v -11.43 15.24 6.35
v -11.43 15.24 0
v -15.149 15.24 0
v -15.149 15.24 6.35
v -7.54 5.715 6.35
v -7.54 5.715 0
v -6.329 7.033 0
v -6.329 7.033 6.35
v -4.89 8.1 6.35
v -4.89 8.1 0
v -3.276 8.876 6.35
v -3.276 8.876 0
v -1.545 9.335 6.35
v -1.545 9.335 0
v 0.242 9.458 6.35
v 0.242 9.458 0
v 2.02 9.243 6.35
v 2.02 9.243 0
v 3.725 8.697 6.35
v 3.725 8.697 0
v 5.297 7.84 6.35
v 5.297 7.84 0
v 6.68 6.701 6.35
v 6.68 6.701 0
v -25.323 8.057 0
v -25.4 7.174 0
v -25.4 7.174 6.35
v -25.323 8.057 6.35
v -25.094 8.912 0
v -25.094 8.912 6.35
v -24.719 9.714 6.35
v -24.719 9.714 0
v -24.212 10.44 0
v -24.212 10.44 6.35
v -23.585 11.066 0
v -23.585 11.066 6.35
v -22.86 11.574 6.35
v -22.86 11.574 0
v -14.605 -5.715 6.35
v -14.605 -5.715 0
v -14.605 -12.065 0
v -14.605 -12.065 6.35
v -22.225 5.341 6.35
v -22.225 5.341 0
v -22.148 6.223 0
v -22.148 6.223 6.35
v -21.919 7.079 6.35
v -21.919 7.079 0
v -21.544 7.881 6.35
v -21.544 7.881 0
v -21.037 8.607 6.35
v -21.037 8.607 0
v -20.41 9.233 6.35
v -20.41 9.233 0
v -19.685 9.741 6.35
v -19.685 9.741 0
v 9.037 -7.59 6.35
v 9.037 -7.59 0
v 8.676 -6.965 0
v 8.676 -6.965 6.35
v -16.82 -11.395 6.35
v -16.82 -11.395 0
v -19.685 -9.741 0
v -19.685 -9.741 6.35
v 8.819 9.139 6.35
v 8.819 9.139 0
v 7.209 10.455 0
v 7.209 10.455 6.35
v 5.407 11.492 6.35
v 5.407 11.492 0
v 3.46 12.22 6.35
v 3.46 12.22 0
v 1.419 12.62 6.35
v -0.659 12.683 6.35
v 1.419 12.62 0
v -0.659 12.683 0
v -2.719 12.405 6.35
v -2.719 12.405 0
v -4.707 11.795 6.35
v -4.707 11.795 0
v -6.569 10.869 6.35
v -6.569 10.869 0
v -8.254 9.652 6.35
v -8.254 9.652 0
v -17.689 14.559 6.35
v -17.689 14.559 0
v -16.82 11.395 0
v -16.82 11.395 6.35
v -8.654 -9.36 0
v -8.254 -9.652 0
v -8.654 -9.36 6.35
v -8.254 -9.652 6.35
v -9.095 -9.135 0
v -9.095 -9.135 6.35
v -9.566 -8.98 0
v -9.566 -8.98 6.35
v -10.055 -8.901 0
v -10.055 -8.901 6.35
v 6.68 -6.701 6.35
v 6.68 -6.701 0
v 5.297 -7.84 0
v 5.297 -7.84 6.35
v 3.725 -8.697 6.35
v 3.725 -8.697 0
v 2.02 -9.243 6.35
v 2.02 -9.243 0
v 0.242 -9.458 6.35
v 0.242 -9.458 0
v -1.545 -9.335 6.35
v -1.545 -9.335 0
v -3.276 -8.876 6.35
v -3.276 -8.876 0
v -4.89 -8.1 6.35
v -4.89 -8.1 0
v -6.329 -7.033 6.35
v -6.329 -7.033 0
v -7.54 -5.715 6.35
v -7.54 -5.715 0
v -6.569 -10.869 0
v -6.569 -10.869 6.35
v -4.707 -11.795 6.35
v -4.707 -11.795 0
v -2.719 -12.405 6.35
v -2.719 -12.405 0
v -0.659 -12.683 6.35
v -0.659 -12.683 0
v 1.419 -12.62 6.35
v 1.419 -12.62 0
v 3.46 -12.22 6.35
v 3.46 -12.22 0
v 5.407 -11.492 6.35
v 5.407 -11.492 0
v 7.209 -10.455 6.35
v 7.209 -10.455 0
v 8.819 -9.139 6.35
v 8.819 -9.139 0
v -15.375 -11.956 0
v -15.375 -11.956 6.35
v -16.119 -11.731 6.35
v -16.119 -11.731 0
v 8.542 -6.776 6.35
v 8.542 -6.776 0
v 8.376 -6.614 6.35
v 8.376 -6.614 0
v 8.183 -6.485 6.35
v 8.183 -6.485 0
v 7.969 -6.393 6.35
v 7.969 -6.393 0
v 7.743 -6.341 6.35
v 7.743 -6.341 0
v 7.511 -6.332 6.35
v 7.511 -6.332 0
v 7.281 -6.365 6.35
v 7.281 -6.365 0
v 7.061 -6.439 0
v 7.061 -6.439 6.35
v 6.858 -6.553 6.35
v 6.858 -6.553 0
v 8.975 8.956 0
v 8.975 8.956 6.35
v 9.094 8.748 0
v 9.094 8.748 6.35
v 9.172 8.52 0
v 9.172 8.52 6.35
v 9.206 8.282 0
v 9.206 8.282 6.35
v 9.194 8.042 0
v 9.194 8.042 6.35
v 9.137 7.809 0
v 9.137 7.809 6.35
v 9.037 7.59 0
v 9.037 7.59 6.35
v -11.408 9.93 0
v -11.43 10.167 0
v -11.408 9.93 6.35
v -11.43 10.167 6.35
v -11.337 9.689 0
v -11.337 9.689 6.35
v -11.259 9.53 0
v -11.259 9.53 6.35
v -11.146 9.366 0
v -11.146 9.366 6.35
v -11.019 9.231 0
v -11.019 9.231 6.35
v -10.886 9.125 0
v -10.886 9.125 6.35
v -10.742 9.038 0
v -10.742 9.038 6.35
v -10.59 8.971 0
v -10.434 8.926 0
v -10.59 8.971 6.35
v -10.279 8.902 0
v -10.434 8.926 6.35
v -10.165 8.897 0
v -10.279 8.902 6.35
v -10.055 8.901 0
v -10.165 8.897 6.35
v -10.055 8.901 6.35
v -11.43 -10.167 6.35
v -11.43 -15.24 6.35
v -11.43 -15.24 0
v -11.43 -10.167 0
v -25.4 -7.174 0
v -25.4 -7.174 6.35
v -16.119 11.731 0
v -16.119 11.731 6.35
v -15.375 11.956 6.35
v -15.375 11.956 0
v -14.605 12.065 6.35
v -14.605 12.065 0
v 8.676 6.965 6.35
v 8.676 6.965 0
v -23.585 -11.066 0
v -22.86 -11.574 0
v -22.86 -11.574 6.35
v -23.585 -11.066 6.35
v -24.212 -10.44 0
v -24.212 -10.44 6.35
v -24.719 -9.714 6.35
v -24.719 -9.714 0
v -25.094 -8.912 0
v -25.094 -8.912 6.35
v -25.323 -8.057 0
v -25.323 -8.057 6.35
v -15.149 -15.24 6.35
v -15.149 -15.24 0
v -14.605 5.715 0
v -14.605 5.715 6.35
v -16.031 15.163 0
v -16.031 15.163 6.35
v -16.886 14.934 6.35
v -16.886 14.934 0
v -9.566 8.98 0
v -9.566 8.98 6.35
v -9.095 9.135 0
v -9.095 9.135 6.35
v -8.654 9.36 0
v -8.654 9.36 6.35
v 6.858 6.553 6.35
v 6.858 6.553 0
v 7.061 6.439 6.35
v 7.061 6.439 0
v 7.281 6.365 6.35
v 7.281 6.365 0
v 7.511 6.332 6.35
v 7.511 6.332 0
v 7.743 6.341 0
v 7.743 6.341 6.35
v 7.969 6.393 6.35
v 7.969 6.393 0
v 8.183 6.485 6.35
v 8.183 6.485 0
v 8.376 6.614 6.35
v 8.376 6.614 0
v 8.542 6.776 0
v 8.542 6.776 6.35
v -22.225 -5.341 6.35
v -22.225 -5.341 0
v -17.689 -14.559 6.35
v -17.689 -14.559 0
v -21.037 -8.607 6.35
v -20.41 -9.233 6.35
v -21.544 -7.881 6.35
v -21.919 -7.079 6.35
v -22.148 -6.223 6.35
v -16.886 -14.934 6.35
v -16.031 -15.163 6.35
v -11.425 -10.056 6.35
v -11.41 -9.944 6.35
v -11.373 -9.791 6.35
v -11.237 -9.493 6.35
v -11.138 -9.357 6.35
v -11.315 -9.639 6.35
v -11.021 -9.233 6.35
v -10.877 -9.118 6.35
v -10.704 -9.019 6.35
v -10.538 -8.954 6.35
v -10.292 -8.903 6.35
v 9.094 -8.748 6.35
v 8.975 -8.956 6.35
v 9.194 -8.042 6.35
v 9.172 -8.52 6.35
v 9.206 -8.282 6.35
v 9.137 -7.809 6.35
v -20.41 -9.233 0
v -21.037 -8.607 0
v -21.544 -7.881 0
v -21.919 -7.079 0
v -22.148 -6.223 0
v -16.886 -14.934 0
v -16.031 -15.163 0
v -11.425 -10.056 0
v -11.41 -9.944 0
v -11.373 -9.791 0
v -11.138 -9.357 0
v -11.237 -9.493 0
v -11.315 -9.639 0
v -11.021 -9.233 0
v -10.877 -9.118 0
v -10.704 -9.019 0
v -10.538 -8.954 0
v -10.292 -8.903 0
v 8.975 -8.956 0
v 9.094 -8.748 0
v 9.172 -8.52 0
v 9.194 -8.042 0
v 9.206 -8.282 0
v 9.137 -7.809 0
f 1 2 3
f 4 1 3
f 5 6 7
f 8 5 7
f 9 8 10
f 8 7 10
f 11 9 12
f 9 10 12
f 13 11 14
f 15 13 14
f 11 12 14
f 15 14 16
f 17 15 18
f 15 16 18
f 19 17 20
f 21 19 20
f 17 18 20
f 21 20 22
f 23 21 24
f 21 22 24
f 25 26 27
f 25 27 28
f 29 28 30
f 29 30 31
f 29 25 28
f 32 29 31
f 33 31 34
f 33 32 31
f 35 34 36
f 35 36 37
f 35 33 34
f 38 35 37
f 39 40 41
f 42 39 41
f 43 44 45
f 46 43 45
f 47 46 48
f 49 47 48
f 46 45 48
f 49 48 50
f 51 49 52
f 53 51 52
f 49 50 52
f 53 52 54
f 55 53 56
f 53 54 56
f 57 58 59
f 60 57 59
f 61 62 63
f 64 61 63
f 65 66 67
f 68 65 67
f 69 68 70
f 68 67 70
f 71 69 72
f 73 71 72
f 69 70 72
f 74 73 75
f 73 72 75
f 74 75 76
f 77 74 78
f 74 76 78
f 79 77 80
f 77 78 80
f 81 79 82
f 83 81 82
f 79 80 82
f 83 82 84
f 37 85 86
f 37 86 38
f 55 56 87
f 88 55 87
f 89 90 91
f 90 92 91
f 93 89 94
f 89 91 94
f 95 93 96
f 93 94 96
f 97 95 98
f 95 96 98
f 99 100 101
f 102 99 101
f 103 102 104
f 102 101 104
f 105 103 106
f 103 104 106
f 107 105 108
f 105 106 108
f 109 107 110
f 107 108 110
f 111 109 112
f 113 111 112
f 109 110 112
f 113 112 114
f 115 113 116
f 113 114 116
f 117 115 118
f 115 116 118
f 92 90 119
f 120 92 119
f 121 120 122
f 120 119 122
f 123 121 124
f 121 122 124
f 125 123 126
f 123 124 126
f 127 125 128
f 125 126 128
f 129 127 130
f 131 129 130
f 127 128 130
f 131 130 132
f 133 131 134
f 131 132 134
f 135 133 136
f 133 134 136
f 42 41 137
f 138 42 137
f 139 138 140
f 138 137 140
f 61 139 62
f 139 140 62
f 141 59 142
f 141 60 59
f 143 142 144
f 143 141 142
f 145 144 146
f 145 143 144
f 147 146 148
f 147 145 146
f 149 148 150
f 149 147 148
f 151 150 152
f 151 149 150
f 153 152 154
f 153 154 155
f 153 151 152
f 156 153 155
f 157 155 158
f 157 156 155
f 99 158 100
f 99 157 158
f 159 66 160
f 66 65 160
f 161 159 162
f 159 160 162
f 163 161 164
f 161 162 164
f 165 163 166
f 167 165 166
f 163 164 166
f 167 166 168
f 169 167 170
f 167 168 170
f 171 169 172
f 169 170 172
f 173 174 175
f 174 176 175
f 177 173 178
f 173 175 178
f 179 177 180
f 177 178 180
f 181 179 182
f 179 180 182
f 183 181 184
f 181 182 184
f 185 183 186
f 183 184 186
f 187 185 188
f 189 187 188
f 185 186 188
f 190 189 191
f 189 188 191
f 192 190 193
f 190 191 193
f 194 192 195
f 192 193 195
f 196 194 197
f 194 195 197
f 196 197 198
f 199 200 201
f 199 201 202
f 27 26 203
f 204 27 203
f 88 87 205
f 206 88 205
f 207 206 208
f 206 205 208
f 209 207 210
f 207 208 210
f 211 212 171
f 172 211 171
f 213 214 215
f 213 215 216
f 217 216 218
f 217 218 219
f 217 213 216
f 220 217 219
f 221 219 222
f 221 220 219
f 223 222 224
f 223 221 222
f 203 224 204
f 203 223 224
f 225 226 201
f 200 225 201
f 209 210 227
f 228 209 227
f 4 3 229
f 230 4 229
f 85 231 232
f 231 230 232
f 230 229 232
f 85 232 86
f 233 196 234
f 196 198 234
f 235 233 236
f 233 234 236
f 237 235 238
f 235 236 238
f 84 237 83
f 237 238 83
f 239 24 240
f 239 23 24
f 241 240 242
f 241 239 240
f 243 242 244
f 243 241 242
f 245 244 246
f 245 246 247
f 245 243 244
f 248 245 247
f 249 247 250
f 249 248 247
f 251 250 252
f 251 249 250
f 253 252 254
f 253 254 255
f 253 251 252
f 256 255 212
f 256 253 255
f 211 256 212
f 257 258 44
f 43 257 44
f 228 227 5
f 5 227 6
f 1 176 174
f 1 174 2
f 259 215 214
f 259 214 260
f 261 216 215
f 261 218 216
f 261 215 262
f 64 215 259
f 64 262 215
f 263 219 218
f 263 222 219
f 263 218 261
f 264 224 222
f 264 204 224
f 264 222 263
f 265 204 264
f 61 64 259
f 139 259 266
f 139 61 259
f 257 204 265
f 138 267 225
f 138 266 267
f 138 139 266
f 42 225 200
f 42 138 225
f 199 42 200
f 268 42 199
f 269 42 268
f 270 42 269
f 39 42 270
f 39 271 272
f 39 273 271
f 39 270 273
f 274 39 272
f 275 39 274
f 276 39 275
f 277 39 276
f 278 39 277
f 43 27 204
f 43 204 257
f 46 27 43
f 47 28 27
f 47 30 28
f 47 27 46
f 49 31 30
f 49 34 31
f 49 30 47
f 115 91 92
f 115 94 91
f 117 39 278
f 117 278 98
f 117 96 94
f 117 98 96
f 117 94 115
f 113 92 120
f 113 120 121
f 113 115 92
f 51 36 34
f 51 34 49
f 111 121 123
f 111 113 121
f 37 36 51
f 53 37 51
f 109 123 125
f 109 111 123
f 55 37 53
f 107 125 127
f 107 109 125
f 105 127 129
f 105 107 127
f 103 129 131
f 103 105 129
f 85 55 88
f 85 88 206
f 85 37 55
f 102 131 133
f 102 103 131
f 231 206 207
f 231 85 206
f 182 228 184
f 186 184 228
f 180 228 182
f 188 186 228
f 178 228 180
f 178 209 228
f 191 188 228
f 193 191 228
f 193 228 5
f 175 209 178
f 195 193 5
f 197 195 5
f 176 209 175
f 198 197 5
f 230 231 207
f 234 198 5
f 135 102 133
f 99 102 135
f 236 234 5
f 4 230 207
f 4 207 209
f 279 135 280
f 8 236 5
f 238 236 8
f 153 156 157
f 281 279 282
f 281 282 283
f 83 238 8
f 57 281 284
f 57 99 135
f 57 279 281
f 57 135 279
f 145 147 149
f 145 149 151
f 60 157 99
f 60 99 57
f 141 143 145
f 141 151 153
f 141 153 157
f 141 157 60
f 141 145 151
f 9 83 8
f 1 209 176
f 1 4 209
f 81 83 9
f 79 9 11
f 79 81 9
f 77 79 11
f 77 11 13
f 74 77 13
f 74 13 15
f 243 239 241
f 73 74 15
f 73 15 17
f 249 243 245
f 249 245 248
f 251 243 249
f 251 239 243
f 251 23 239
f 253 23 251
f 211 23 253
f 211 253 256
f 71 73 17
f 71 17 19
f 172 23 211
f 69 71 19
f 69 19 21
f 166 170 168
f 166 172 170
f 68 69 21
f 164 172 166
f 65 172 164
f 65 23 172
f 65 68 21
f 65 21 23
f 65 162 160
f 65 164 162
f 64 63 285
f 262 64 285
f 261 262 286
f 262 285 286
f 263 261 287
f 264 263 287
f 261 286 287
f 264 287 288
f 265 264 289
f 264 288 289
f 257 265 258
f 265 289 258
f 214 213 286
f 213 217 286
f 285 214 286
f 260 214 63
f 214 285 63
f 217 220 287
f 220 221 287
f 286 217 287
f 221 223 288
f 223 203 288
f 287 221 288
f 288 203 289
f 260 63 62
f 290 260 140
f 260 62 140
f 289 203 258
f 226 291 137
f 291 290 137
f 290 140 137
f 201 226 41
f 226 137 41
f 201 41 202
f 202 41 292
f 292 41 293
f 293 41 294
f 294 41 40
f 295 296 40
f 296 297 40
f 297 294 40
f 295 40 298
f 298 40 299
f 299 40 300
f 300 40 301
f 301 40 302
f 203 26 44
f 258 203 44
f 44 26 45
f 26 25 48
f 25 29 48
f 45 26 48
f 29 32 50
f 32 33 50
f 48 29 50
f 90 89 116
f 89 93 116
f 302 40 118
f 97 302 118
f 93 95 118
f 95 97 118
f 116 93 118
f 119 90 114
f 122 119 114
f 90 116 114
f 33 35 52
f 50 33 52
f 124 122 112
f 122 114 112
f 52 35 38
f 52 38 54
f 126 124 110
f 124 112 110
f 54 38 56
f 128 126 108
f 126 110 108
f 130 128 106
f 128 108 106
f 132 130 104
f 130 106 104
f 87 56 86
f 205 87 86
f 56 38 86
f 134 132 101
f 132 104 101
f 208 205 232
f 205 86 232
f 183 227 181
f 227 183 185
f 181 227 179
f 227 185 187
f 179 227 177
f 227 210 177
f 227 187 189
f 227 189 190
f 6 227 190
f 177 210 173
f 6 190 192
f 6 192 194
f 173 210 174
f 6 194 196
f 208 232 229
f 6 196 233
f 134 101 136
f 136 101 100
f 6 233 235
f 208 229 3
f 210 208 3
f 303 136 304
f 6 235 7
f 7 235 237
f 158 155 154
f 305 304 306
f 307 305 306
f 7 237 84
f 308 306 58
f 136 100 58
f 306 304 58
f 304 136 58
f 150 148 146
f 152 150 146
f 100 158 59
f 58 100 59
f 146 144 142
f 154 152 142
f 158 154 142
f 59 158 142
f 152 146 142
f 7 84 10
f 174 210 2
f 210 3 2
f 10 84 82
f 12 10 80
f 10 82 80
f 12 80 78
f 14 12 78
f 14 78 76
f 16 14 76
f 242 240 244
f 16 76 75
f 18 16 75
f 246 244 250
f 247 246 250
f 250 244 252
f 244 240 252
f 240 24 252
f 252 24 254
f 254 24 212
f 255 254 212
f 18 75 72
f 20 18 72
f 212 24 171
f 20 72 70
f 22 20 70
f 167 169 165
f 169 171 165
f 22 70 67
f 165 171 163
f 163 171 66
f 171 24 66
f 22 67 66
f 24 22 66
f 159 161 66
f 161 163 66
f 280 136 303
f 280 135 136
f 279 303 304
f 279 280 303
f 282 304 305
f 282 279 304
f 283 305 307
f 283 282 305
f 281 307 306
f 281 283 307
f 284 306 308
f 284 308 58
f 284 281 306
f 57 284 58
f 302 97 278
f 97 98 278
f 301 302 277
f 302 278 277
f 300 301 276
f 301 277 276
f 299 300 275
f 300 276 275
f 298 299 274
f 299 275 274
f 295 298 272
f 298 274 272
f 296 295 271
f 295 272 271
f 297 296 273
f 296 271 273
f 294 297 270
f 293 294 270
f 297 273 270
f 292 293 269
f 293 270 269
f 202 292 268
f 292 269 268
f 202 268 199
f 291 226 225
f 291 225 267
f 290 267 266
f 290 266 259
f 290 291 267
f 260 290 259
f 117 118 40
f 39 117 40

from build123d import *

# Parameters (mm, degrees)
F1_DEPTH     = 6.35
F2_T1_DEPTH  = 6.35
F2_T3_DEPTH  = 6.35
F2_T5_DEPTH  = 6.35
F2_T7_DEPTH  = 6.35
F2_T9_DEPTH  = 13.1559094878
F2_T11_DEPTH = 21.0146968374
F2_T13_DEPTH = 21.0146968374
F2_T15_DEPTH = 13.1559094878
F3_R         = 3.175
F4_R         = 1.27
F5_R         = 1.27


# Not quite as in the source:
# - a fillet or chamfer that OpenCascade refuses, or shapes differently, is made with other operations: its cross-section is extruded or revolved along the edge and cut away or added


with BuildPart() as f1:
    # F0 (on Top) → F1 (new body)
    with BuildSketch(Plane.XY):
        with BuildLine():
            ThreePointArc((7.7709057387, -5.3975), (0.1961534845, -9.4594664786), (-7.5404746038, -5.715))
            Line((-7.5404746038, -5.715), (-14.605, -5.715))
            Line((-14.605, -5.715), (-14.605, -12.065))
            Line((-14.605, -12.065), (-15.659261314, -12.065))
            Line((-15.659261314, -12.065), (-22.225, -8.2742690022))
            Line((-22.225, -8.2742690022), (-22.225, 8.2742690022))
            Line((-22.225, 8.2742690022), (-15.659261314, 12.065))
            Line((-15.659261314, 12.065), (-14.605, 12.065))
            Line((-14.605, 12.065), (-14.605, 5.715))
            Line((-14.605, 5.715), (-7.5404746038, 5.715))
            ThreePointArc((-7.5404746038, 5.715), (0.1961534845, 9.4594664786), (7.7709057387, 5.3975))
            Line((7.7709057387, 5.3975), (9.5126338349, 8.4142615555))
            ThreePointArc((9.5126338349, 8.4142615555), (0.3250359785, 12.6958399333), (-9.0696141042, 8.89))
            Line((-9.0696141042, 8.89), (-11.43, 8.89))
            Line((-11.43, 8.89), (-11.43, 15.24))
            Line((-11.43, 15.24), (-16.51, 15.24))
            Line((-16.51, 15.24), (-25.4, 10.1073561069))
            Line((-25.4, 10.1073561069), (-25.4, -10.1073561069))
            Line((-25.4, -10.1073561069), (-16.51, -15.24))
            Line((-16.51, -15.24), (-11.43, -15.24))
            Line((-11.43, -15.24), (-11.43, -8.89))
            Line((-11.43, -8.89), (-9.0696141042, -8.89))
            ThreePointArc((-9.0696141042, -8.89), (0.3250359785, -12.6958399333), (9.5126338349, -8.4142615555))
            Line((9.5126338349, -8.4142615555), (7.7709057387, -5.3975))
        make_face()
    extrude(amount=F1_DEPTH)

    # F2: fillet of radius 5.08 on 8 edges, made by hand

    # F2_s2 → F2_t1 (join)
    with BuildSketch(Plane.XY):
        with BuildLine():
            ThreePointArc((-14.605, -12.065), (-15.7512023765, -11.857721614), (-16.8200610521, -11.3948119587))
            Line((-16.8200610521, -11.3948119587), (-15.659261314, -12.065))
            Line((-15.659261314, -12.065), (-14.605, -12.065))
        make_face()
    extrude(amount=F2_T1_DEPTH)

    # F2_s4 → F2_t3 (join)
    with BuildSketch(Plane.XY):
        with BuildLine():
            ThreePointArc((-19.685, -9.740738686), (-21.5444090512, -7.8813296347), (-22.225, -5.3413296347))
            Line((-22.225, -5.3413296347), (-22.225, -8.2742690022))
            Line((-22.225, -8.2742690022), (-19.685, -9.740738686))
        make_face()
    extrude(amount=F2_T3_DEPTH)

    # F2_s6 → F2_t5 (join)
    with BuildSketch(Plane.XY):
        with BuildLine():
            ThreePointArc((-22.225, 5.3413296347), (-21.5444090512, 7.8813296347), (-19.685, 9.740738686))
            Line((-19.685, 9.740738686), (-22.225, 8.2742690022))
            Line((-22.225, 8.2742690022), (-22.225, 5.3413296347))
        make_face()
    extrude(amount=F2_T5_DEPTH)

    # F2_s8 → F2_t7 (join)
    with BuildSketch(Plane.XY):
        with BuildLine():
            ThreePointArc((-16.8200610521, 11.3948119587), (-15.7512023765, 11.857721614), (-14.605, 12.065))
            Line((-14.605, 12.065), (-15.659261314, 12.065))
            Line((-15.659261314, 12.065), (-16.8200610521, 11.3948119587))
        make_face()
    extrude(amount=F2_T7_DEPTH)

    # F2_s10 → F2_t9 (cut)
    with BuildSketch(Plane.XY.offset(-3.4029547439)):
        with BuildLine():
            ThreePointArc((-15.1488181024, 15.24), (-16.4636188516, 15.0669031975), (-17.6888181024, 14.5594090512))
            Line((-17.6888181024, 14.5594090512), (-16.51, 15.24))
            Line((-16.51, 15.24), (-15.1488181024, 15.24))
        make_face()
    extrude(amount=F2_T9_DEPTH, mode=Mode.SUBTRACT)

    # F2_s12 → F2_t11 (cut)
    with BuildSketch(Plane.XY.offset(-7.3323484187)):
        with BuildLine():
            ThreePointArc((-25.4, 7.1744167394), (-24.7194090512, 9.7144167394), (-22.86, 11.5738257906))
            Line((-22.86, 11.5738257906), (-25.4, 10.1073561069))
            Line((-25.4, 10.1073561069), (-25.4, 7.1744167394))
        make_face()
    extrude(amount=F2_T11_DEPTH, mode=Mode.SUBTRACT)

    # F2_s14 → F2_t13 (cut)
    with BuildSketch(Plane.XY.offset(-7.3323484187)):
        with BuildLine():
            ThreePointArc((-22.86, -11.5738257906), (-24.7194090512, -9.7144167394), (-25.4, -7.1744167394))
            Line((-25.4, -7.1744167394), (-25.4, -10.1073561069))
            Line((-25.4, -10.1073561069), (-22.86, -11.5738257906))
        make_face()
    extrude(amount=F2_T13_DEPTH, mode=Mode.SUBTRACT)

    # F2_s16 → F2_t15 (cut)
    with BuildSketch(Plane.XY.offset(-3.4029547439)):
        with BuildLine():
            ThreePointArc((-15.1488181024, -15.24), (-16.4636188516, -15.0669031975), (-17.6888181024, -14.5594090512))
            Line((-17.6888181024, -14.5594090512), (-16.51, -15.24))
            Line((-16.51, -15.24), (-15.1488181024, -15.24))
        make_face()
    extrude(amount=F2_T15_DEPTH, mode=Mode.SUBTRACT)

    # F3
    f3_edges = [f1.edges().sort_by_distance(p)[0] for p in [
        (-9.069614, 8.89, 3.175),
        (-9.069614, -8.89, 3.175),
    ]]
    fillet(f3_edges, radius=F3_R)

    # F4
    f4_edges = [f1.edges().sort_by_distance(p)[0] for p in [
        (-11.43, -8.89, 3.175),
        (-11.43, 8.89, 3.175),
    ]]
    fillet(f4_edges, radius=F4_R)

    # F5
    f5_edges = [f1.edges().sort_by_distance(p)[0] for p in [
        (7.770906, -5.3975, 3.175),
        (9.512634, -8.414262, 3.175),
        (9.512634, 8.414262, 3.175),
        (7.770906, 5.3975, 3.175),
    ]]
    fillet(f5_edges, radius=F5_R)


solid = f1.part
